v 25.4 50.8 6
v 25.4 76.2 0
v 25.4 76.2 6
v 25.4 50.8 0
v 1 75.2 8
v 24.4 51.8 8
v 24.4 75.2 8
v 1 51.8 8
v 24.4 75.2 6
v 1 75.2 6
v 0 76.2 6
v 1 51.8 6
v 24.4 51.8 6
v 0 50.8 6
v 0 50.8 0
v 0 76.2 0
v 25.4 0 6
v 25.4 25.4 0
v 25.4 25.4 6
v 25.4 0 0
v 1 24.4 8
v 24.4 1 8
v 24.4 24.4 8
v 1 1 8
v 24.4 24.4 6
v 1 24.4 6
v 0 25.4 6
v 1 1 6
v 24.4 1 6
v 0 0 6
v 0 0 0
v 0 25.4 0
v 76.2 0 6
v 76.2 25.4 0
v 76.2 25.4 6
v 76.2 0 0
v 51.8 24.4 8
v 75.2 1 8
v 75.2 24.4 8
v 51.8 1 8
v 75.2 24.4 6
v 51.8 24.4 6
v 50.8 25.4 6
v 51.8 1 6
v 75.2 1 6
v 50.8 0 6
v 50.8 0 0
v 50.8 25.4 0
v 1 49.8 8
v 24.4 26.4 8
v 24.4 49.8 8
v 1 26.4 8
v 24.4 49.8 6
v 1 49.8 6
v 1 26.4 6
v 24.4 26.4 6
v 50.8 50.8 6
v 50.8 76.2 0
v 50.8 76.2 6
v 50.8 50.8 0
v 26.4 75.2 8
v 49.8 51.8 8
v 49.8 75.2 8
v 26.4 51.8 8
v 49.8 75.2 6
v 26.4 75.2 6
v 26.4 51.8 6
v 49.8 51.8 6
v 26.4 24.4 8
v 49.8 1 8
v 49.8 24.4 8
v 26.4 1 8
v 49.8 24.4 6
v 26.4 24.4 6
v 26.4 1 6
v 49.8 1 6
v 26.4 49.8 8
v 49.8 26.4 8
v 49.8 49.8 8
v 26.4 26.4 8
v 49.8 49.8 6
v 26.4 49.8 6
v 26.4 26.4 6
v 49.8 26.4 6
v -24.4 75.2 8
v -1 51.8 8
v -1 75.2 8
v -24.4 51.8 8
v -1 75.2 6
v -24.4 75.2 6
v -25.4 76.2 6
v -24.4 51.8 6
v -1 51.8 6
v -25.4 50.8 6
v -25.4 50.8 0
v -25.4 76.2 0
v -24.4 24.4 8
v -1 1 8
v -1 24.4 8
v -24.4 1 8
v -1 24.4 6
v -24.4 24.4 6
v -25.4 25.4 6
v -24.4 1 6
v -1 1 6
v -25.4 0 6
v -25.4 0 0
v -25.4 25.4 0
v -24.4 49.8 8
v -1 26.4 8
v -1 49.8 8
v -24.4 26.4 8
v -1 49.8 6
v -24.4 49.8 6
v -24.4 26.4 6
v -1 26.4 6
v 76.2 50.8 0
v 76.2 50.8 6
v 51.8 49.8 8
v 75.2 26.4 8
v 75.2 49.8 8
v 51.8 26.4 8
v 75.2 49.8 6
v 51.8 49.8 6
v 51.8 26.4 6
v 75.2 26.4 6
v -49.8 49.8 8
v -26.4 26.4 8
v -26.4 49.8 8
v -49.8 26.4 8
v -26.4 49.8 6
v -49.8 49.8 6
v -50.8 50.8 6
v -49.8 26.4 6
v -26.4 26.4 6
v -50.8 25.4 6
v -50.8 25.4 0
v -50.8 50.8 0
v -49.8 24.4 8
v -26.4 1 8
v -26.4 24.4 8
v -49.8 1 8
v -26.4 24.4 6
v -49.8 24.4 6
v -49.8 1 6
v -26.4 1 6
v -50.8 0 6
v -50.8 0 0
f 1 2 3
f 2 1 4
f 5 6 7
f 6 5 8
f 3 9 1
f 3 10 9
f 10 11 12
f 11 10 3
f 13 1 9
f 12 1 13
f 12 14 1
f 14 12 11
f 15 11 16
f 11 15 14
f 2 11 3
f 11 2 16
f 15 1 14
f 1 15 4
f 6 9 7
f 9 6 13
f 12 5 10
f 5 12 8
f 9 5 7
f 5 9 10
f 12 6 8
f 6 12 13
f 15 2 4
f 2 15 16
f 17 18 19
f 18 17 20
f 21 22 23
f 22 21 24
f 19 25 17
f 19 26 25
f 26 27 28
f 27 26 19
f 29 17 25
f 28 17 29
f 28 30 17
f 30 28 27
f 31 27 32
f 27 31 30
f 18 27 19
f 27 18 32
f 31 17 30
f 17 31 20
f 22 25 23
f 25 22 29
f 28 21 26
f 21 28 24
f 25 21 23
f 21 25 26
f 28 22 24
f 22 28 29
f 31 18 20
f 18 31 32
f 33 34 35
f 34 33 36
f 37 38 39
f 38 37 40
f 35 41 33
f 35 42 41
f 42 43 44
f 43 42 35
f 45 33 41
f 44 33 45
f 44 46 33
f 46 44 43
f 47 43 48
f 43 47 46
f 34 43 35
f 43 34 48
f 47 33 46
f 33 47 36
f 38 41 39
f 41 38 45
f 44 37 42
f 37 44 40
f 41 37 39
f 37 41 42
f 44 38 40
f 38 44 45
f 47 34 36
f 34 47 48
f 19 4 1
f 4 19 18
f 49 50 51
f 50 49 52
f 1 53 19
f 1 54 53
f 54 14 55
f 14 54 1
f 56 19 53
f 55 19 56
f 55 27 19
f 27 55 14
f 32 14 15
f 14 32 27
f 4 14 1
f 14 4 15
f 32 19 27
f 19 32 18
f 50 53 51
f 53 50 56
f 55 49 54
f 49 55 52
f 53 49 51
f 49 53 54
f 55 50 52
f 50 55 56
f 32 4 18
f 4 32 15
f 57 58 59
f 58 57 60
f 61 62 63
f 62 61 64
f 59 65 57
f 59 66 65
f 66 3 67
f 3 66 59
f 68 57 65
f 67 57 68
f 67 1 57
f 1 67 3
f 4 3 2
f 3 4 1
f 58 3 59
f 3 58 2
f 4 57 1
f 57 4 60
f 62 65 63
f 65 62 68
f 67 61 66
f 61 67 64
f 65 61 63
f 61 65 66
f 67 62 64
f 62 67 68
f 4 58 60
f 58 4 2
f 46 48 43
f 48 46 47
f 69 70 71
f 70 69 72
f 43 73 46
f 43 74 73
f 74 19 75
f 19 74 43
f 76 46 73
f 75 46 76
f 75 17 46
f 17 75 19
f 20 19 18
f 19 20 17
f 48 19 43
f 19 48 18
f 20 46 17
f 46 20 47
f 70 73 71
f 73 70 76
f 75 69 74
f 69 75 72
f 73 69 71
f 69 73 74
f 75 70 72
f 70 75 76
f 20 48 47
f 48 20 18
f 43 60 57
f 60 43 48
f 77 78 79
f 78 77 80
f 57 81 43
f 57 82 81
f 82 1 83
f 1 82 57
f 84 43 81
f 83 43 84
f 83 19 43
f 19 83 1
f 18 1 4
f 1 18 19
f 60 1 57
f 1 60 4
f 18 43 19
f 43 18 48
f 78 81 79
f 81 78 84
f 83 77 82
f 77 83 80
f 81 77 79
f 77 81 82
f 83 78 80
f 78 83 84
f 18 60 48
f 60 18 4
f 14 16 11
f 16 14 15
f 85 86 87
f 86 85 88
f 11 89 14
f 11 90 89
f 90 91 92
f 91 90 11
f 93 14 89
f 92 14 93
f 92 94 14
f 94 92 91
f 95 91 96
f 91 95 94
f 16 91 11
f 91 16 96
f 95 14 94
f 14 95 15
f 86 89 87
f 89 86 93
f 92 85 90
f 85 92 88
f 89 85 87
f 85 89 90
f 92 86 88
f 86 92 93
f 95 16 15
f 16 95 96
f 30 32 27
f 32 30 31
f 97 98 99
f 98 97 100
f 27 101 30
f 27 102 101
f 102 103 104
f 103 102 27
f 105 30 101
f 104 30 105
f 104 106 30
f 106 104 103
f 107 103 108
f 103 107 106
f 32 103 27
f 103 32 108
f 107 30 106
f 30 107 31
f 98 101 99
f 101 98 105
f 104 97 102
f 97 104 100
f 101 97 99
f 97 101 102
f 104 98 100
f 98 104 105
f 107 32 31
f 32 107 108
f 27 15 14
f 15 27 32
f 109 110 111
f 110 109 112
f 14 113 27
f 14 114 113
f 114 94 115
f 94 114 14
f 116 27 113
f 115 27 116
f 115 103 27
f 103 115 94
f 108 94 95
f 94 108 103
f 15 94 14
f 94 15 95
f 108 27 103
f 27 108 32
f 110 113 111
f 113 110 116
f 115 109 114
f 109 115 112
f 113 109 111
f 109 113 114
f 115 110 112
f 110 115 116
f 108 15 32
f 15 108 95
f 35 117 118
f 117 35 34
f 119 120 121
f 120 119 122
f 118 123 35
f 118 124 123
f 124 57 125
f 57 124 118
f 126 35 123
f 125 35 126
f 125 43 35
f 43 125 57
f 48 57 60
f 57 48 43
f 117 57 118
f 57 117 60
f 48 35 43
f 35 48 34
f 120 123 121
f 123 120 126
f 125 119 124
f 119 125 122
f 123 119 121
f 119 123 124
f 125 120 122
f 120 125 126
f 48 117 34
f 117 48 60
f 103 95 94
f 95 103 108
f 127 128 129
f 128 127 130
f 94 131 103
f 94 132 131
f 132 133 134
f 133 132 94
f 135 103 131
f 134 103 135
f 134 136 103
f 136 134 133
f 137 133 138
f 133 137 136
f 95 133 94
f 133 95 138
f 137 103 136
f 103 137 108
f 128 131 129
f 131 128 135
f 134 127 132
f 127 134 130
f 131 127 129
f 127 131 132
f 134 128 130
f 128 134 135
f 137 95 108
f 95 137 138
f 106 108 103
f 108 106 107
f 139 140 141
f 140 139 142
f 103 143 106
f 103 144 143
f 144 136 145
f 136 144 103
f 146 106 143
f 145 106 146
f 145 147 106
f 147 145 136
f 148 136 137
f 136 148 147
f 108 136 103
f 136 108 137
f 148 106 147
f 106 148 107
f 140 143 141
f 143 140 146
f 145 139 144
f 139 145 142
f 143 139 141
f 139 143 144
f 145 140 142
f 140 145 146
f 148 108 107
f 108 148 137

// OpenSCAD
// file: DND Play Area Config.scad
/** Size of each square floor tile */
SQUARE_SIZE = 25.4;
/** Thickness of tiles*/
TILE_THICKNESS = 8;
/** Width and thickness of the dip between tiles */
DIP_DIMENSIONS = TILE_THICKNESS*0.25;
/** Scale of the connection shape to use for the indents into blocks (so that other pieces fit in them) */
CONNECTION_HOLE_SCALE = 1.05;
/** Diameter of the connection holes/pegs */
CONNECTION_PEG_DIAMETER = SQUARE_SIZE*0.75;
/** Height of the connection peg */
CONNECTION_PEG_HEIGHT = TILE_THICKNESS/2;
/** Height of connection columns (for multi-level buildings this is the standard height of one floor) */
CONNECTION_COLUMN_HEIGHT = SQUARE_SIZE*4;
/** Whether the dip should come outside the square size or if it should be included */
DIP_OUTSIDE_SQUARE = false; // Some things are currently not configured for the dip being outside the square

/**
 * @brief This shape is used to connect various pieces together
 */
module connection_shape(_center=false) {
    cylinder($fn=6,d=CONNECTION_PEG_DIAMETER,h=CONNECTION_PEG_HEIGHT,center=_center);
}

/**
 * @brief Arranges this shape to be cutout of a tile
 */
module cutout_connection_shape(_bothSides=false,_center=false) {
    translate_amount = DIP_OUTSIDE_SQUARE ? (SQUARE_SIZE+DIP_DIMENSIONS)/2 : SQUARE_SIZE/2;
    translate([translate_amount,translate_amount,_bothSides ? 0 : TILE_THICKNESS/2])
        scale([1,1,_bothSides ? 2 : 1])
            connection_shape(_center);
}

/**
 * @brief Converts numbers into tile size for use as coordinates
 */
function tile_coordinates(_x,_y,_z) = [_x*SQUARE_SIZE,_y*SQUARE_SIZE,_z*SQUARE_SIZE];

/**
 * @brief Translates an object using the tile coordinate system
 * @param _point Point to translate to
 */
module tile_translate(_point) {
    for(i=[0:$children-1])
        translate(tile_coordinates(_point[0],_point[1],_point[2]))
            children(i);
}
// file: DND Play Area Tiles.scad
/**
 * @brief This file contains various types of tiles and other modules for non-assembled/arranged pieces
 * TODO Add textures to tiles
 * TODO Tile square module
 * TODO Tile circle module
 * TODO Basic tile replacement module
 * TODO Wall modules
 */

include <DND Play Area Config.scad>;

/**
 * @brief Basic tile to use for floors
 * @param center Whether or not to center the tile
 */
module basic_tile(_center=false) {
    if (DIP_OUTSIDE_SQUARE) {
        difference() {
            // Main tile piece
            cube([SQUARE_SIZE+DIP_DIMENSIONS,SQUARE_SIZE+DIP_DIMENSIONS,TILE_THICKNESS],_center);
            // Tile dip
            translate([0,0,TILE_THICKNESS-DIP_DIMENSIONS])
                difference() {
                    cube([SQUARE_SIZE+DIP_DIMENSIONS,SQUARE_SIZE+DIP_DIMENSIONS,DIP_DIMENSIONS],_center);
                translate([DIP_DIMENSIONS/2,DIP_DIMENSIONS/2,0])
                    cube([SQUARE_SIZE,SQUARE_SIZE,DIP_DIMENSIONS],_center);
                }
        }
    } else {
        difference() {
            // Main tile piece
            cube([SQUARE_SIZE,SQUARE_SIZE,TILE_THICKNESS],_center);
            // Tile dip
            translate([0,0,TILE_THICKNESS-DIP_DIMENSIONS])
                difference() {
                    cube([SQUARE_SIZE,SQUARE_SIZE,DIP_DIMENSIONS],_center);
                    translate([DIP_DIMENSIONS/2,DIP_DIMENSIONS/2,0])
                        cube([SQUARE_SIZE-DIP_DIMENSIONS,SQUARE_SIZE-DIP_DIMENSIONS,DIP_DIMENSIONS],_center);
                }
        }
    }
}

/**
 * @brief This tile can be placed on play areas to link them to other pieces.
 * @param _center Whether or not to center the tile
 * @param _bothsides Whether the connection hole should be on both sides or just the top one
 */
module connection_tile(_center=false,_bothsides=false) {
    translate_amount = DIP_OUTSIDE_SQUARE ? (SQUARE_SIZE+DIP_DIMENSIONS)/2 : SQUARE_SIZE/2;
    difference() {
        basic_tile(_center);
        translate([translate_amount,translate_amount,_bothsides ? 0 : TILE_THICKNESS/2])
        scale([1,1,_bothsides ? 2 : 1])
            connection_shape(_center);
    }
}

/**
 * @brief Column for connecting pieces vertically
 */
module connection_column() {
    connection_shape();
    translate([0,0,CONNECTION_PEG_HEIGHT+CONNECTION_COLUMN_HEIGHT/2])
        cube([SQUARE_SIZE,SQUARE_SIZE,CONNECTION_COLUMN_HEIGHT],true);
    translate([0,0,CONNECTION_PEG_HEIGHT+CONNECTION_COLUMN_HEIGHT])
    connection_shape();
}

/**
 * @brief Creates a line of basic tiles of a specified length
 */
module tile_line(_length) {
    for(i=[0:_length-1])
        translate([i*SQUARE_SIZE,0,0])
            basic_tile();
}

/**
 * @brief Creates a rectangle of basic tiles
 */
module tile_rectangle(_length,_width) {
    for(i=[0:_width-1])
        translate([0,i*SQUARE_SIZE,0])
            tile_line(_length);
}

/**
 * @brief Creates a rectangle to fit between two points
 * @param _cordsOne Array(3) of points (x,y,z), used as rectangles home (should be to the right of _cordsTwo
 * @param _cordsTwo Array(3) of points (x,y,z)
 */
module tile_rectangle_between_points(_cordsOne, _cordsTwo) {
    translate(tile_coordinates(_cordsOne[0],_cordsOne[1],_cordsOne[2])) {
        
        rectX = (_cordsOne[0] == _cordsTwo[0]) ? 1 :  abs(_cordsOne[0]-_cordsTwo[0]);
        
        rectY = (_cordsOne[1] == _cordsTwo[1]) ? 1 : abs(_cordsOne[1]-_cordsTwo[1]);
        
        tile_rectangle(rectX,rectY);
    }
}
// main file
use <DND Play Area Tiles.scad>;
include <DND Play Area Config.scad>;

/**
 * @brief This creates a circle out of basic tiles with a diameter of 5
 * @note 
 */
module tile_circle_5() {
    translate(tile_coordinates(1,0,0))
        tile_rectangle(3,5);
    translate(tile_coordinates(0,1,0))
        tile_rectangle(5,3);
}

/**
 * @brief This creates a circle out of basic tiles with a diameter of 7
 */
module tile_circle_7() {
    translate(tile_coordinates(2,0,0))
        tile_rectangle(3,7);
    translate(tile_coordinates(0,2,0))
        tile_rectangle(7,3);
    translate(tile_coordinates(1,1,0))
        basic_tile();
    translate(tile_coordinates(1,5,0))
        basic_tile();
    translate(tile_coordinates(5,1,0))
        basic_tile();
    translate(tile_coordinates(5,5,0))
        basic_tile();
}

/**
 * @brief This creates a circle out of basic tiles with a diameter of 9
 */
module tile_circle_9() {
    translate(tile_coordinates(2,0,0))
        tile_rectangle(5,9);
    translate(tile_coordinates(0,2,0))
        tile_rectangle(9,5);
    translate(tile_coordinates(1,1,0))
        basic_tile();
    translate(tile_coordinates(1,7,0))
        basic_tile();
    translate(tile_coordinates(7,1,0))
        basic_tile();
    translate(tile_coordinates(7,7,0))
        basic_tile();
}

/**
 * @brief This creates a circle of any (probably) size with 8-point symmetry
 */
module eight_sym_circle(_xCenter, _yCenter, _radius) {
    
        r2 = _radius * _radius;
        translate(tile_coordinates(_xCenter, _yCenter + _radius,0))
            basic_tile();
        translate(tile_coordinates(_xCenter, _yCenter - _radius,0))
            basic_tile();
        translate(tile_coordinates(_xCenter + _radius, _yCenter,0))
            basic_tile();
        translate(tile_coordinates(_xCenter - _radius, _yCenter,0))
            basic_tile();

        y = radius;
        x = 1;
        y = round(sqrt(r2 - 1) + 0.5);
        for (x=[1:y]) {
            translate(tile_coordinates(_xCenter + x, _yCenter + y,0))
                basic_tile();
            translate(tile_coordinates(_xCenter + x, _yCenter - y,0))
                basic_tile();
            translate(tile_coordinates(_xCenter - x, _yCenter + y,0))
                basic_tile();
            translate(tile_coordinates(_xCenter - x, _yCenter - y,0))
                basic_tile();
            translate(tile_coordinates(_xCenter + y, _yCenter + x,0))
                basic_tile();
            translate(tile_coordinates(_xCenter + y, _yCenter - x,0))
                basic_tile();
            translate(tile_coordinates(_xCenter - y, _yCenter + x,0))
                basic_tile();
            translate(tile_coordinates(_xCenter - y, _yCenter - x,0))
                basic_tile();
            y = round(sqrt(r2 - x*x) + 0.5);
        }
        if (x == y) {
            translate(tile_coordinates(_xCenter + x, _yCenter + y,0));
            translate(tile_coordinates(_xCenter + x, _yCenter - y,0));
            translate(tile_coordinates(_xCenter - x, _yCenter + y,0));
            translate(tile_coordinates(_xCenter - x, _yCenter - y,0));
        }

    
}

/**
 * @brief This creates a circle of any (probably) size with 8-point symmetry
 * This uese the algorithm from the bottom of the page here http://groups.csail.mit.edu/graphics/classes/6.837/F98/Lecture6/circle.html for generation of the outer circle (see module eight_sym_circle for this algorithms implimentation without filling it)
 */
module filled_eight_sym_circle(_xCenter, _yCenter, _radius) {
    
    translate(tile_coordinates(_xCenter, _yCenter + _radius,0))
        basic_tile();
    translate(tile_coordinates(_xCenter, _yCenter - _radius,0))
        basic_tile();
    translate(tile_coordinates(_xCenter + _radius, _yCenter,0))
        basic_tile();
    tile_rectangle_between_points([_xCenter,_yCenter - _radius,0],[_xCenter ,_yCenter + _radius,0]);
    
    r2 = _radius * _radius;
    y = radius;
    x = 1;
    y = round(sqrt(r2 - 1) + 0.5);
    for (x=[1:y]) {
        translate(tile_coordinates(_xCenter + x, _yCenter + y,0))
            basic_tile();
        tile_rectangle_between_points([_xCenter + x,_yCenter - y,0],[_xCenter + x,_yCenter + y,0]);
        translate(tile_coordinates(_xCenter - x, _yCenter + y,0))
            basic_tile();
        translate(tile_coordinates(_xCenter - x, _yCenter - y,0))
            basic_tile();
        tile_rectangle_between_points([_xCenter - x,_yCenter - y,0],[_xCenter - x,_yCenter + y,0]);
        translate(tile_coordinates(_xCenter + y, _yCenter + x,0))
            basic_tile();
        translate(tile_coordinates(_xCenter + y, _yCenter - x,0))
            basic_tile();
        translate(tile_coordinates(_xCenter - y, _yCenter + x,0))
            basic_tile();
        translate(tile_coordinates(_xCenter - y, _yCenter - x,0))
            basic_tile();
        y = round(sqrt(r2 - x*x) + 0.5);
    }
    if (x == y) {
        translate(tile_coordinates(_xCenter + x, _yCenter + y,0));
        translate(tile_coordinates(_xCenter + x, _yCenter - y,0));
        translate(tile_coordinates(_xCenter - x, _yCenter + y,0));
        translate(tile_coordinates(_xCenter - x, _yCenter - y,0));
    }
    
}

/**
 * @brief Creates a half circle
 * @param _radius Radius of the half circle
 */
module half_circle(_xCenter, _yCenter, _radius) {
    
    translate(tile_coordinates(_xCenter, _yCenter + _radius,0))
        basic_tile();
    translate(tile_coordinates(_xCenter, _yCenter,0))
        basic_tile();
    translate(tile_coordinates(_xCenter + _radius, _yCenter,0))
        basic_tile();
    tile_rectangle_between_points([_xCenter,_yCenter,0],[_xCenter ,_yCenter + _radius,0]);
    
    r2 = _radius * _radius;
    y = radius;
    x = 1;
    y = round(sqrt(r2 - 1) + 0.5);
    for (x=[1:y]) {
        translate(tile_coordinates(_xCenter + x, _yCenter + y,0))
            basic_tile();
        tile_rectangle_between_points([_xCenter + x,_yCenter,0],[_xCenter + x,_yCenter + y,0]);
        translate(tile_coordinates(_xCenter - x, _yCenter + y,0))
            basic_tile();
        translate(tile_coordinates(_xCenter - x, _yCenter,0))
            basic_tile();
        tile_rectangle_between_points([_xCenter - x,_yCenter,0],[_xCenter - x,_yCenter + y,0]);
        translate(tile_coordinates(_xCenter + y, _yCenter + x,0))
            basic_tile();
        translate(tile_coordinates(_xCenter + y, _yCenter,0))
            basic_tile();
        translate(tile_coordinates(_xCenter - y, _yCenter + x,0))
            basic_tile();
        translate(tile_coordinates(_xCenter - y, _yCenter,0))
            basic_tile();
        y = round(sqrt(r2 - x*x) + 0.5);
    }
    if (x == y) {
        translate(tile_coordinates(_xCenter + x, _yCenter + y,0));
        translate(tile_coordinates(_xCenter + x, _yCenter,0));
        translate(tile_coordinates(_xCenter - x, _yCenter + y,0));
        translate(tile_coordinates(_xCenter - x, _yCenter,0));
    }
}

/**
 * @brief This takes a long time and doesn't generate the best circle - use fileld 8 point symmetry
 * @param _radius Radius of the circle to draw and fill
 */
module draw_filled_circle(_radius) {
    for (y=[-_radius:_radius+1])
        for (x=[-_radius:_radius+1])
            if ((x * x) + (y * y) <= (_radius * _radius))
                translate(tile_coordinates(x,y,0))
                    basic_tile();
}

//render() {
    half_circle(0,0,2);
//}
